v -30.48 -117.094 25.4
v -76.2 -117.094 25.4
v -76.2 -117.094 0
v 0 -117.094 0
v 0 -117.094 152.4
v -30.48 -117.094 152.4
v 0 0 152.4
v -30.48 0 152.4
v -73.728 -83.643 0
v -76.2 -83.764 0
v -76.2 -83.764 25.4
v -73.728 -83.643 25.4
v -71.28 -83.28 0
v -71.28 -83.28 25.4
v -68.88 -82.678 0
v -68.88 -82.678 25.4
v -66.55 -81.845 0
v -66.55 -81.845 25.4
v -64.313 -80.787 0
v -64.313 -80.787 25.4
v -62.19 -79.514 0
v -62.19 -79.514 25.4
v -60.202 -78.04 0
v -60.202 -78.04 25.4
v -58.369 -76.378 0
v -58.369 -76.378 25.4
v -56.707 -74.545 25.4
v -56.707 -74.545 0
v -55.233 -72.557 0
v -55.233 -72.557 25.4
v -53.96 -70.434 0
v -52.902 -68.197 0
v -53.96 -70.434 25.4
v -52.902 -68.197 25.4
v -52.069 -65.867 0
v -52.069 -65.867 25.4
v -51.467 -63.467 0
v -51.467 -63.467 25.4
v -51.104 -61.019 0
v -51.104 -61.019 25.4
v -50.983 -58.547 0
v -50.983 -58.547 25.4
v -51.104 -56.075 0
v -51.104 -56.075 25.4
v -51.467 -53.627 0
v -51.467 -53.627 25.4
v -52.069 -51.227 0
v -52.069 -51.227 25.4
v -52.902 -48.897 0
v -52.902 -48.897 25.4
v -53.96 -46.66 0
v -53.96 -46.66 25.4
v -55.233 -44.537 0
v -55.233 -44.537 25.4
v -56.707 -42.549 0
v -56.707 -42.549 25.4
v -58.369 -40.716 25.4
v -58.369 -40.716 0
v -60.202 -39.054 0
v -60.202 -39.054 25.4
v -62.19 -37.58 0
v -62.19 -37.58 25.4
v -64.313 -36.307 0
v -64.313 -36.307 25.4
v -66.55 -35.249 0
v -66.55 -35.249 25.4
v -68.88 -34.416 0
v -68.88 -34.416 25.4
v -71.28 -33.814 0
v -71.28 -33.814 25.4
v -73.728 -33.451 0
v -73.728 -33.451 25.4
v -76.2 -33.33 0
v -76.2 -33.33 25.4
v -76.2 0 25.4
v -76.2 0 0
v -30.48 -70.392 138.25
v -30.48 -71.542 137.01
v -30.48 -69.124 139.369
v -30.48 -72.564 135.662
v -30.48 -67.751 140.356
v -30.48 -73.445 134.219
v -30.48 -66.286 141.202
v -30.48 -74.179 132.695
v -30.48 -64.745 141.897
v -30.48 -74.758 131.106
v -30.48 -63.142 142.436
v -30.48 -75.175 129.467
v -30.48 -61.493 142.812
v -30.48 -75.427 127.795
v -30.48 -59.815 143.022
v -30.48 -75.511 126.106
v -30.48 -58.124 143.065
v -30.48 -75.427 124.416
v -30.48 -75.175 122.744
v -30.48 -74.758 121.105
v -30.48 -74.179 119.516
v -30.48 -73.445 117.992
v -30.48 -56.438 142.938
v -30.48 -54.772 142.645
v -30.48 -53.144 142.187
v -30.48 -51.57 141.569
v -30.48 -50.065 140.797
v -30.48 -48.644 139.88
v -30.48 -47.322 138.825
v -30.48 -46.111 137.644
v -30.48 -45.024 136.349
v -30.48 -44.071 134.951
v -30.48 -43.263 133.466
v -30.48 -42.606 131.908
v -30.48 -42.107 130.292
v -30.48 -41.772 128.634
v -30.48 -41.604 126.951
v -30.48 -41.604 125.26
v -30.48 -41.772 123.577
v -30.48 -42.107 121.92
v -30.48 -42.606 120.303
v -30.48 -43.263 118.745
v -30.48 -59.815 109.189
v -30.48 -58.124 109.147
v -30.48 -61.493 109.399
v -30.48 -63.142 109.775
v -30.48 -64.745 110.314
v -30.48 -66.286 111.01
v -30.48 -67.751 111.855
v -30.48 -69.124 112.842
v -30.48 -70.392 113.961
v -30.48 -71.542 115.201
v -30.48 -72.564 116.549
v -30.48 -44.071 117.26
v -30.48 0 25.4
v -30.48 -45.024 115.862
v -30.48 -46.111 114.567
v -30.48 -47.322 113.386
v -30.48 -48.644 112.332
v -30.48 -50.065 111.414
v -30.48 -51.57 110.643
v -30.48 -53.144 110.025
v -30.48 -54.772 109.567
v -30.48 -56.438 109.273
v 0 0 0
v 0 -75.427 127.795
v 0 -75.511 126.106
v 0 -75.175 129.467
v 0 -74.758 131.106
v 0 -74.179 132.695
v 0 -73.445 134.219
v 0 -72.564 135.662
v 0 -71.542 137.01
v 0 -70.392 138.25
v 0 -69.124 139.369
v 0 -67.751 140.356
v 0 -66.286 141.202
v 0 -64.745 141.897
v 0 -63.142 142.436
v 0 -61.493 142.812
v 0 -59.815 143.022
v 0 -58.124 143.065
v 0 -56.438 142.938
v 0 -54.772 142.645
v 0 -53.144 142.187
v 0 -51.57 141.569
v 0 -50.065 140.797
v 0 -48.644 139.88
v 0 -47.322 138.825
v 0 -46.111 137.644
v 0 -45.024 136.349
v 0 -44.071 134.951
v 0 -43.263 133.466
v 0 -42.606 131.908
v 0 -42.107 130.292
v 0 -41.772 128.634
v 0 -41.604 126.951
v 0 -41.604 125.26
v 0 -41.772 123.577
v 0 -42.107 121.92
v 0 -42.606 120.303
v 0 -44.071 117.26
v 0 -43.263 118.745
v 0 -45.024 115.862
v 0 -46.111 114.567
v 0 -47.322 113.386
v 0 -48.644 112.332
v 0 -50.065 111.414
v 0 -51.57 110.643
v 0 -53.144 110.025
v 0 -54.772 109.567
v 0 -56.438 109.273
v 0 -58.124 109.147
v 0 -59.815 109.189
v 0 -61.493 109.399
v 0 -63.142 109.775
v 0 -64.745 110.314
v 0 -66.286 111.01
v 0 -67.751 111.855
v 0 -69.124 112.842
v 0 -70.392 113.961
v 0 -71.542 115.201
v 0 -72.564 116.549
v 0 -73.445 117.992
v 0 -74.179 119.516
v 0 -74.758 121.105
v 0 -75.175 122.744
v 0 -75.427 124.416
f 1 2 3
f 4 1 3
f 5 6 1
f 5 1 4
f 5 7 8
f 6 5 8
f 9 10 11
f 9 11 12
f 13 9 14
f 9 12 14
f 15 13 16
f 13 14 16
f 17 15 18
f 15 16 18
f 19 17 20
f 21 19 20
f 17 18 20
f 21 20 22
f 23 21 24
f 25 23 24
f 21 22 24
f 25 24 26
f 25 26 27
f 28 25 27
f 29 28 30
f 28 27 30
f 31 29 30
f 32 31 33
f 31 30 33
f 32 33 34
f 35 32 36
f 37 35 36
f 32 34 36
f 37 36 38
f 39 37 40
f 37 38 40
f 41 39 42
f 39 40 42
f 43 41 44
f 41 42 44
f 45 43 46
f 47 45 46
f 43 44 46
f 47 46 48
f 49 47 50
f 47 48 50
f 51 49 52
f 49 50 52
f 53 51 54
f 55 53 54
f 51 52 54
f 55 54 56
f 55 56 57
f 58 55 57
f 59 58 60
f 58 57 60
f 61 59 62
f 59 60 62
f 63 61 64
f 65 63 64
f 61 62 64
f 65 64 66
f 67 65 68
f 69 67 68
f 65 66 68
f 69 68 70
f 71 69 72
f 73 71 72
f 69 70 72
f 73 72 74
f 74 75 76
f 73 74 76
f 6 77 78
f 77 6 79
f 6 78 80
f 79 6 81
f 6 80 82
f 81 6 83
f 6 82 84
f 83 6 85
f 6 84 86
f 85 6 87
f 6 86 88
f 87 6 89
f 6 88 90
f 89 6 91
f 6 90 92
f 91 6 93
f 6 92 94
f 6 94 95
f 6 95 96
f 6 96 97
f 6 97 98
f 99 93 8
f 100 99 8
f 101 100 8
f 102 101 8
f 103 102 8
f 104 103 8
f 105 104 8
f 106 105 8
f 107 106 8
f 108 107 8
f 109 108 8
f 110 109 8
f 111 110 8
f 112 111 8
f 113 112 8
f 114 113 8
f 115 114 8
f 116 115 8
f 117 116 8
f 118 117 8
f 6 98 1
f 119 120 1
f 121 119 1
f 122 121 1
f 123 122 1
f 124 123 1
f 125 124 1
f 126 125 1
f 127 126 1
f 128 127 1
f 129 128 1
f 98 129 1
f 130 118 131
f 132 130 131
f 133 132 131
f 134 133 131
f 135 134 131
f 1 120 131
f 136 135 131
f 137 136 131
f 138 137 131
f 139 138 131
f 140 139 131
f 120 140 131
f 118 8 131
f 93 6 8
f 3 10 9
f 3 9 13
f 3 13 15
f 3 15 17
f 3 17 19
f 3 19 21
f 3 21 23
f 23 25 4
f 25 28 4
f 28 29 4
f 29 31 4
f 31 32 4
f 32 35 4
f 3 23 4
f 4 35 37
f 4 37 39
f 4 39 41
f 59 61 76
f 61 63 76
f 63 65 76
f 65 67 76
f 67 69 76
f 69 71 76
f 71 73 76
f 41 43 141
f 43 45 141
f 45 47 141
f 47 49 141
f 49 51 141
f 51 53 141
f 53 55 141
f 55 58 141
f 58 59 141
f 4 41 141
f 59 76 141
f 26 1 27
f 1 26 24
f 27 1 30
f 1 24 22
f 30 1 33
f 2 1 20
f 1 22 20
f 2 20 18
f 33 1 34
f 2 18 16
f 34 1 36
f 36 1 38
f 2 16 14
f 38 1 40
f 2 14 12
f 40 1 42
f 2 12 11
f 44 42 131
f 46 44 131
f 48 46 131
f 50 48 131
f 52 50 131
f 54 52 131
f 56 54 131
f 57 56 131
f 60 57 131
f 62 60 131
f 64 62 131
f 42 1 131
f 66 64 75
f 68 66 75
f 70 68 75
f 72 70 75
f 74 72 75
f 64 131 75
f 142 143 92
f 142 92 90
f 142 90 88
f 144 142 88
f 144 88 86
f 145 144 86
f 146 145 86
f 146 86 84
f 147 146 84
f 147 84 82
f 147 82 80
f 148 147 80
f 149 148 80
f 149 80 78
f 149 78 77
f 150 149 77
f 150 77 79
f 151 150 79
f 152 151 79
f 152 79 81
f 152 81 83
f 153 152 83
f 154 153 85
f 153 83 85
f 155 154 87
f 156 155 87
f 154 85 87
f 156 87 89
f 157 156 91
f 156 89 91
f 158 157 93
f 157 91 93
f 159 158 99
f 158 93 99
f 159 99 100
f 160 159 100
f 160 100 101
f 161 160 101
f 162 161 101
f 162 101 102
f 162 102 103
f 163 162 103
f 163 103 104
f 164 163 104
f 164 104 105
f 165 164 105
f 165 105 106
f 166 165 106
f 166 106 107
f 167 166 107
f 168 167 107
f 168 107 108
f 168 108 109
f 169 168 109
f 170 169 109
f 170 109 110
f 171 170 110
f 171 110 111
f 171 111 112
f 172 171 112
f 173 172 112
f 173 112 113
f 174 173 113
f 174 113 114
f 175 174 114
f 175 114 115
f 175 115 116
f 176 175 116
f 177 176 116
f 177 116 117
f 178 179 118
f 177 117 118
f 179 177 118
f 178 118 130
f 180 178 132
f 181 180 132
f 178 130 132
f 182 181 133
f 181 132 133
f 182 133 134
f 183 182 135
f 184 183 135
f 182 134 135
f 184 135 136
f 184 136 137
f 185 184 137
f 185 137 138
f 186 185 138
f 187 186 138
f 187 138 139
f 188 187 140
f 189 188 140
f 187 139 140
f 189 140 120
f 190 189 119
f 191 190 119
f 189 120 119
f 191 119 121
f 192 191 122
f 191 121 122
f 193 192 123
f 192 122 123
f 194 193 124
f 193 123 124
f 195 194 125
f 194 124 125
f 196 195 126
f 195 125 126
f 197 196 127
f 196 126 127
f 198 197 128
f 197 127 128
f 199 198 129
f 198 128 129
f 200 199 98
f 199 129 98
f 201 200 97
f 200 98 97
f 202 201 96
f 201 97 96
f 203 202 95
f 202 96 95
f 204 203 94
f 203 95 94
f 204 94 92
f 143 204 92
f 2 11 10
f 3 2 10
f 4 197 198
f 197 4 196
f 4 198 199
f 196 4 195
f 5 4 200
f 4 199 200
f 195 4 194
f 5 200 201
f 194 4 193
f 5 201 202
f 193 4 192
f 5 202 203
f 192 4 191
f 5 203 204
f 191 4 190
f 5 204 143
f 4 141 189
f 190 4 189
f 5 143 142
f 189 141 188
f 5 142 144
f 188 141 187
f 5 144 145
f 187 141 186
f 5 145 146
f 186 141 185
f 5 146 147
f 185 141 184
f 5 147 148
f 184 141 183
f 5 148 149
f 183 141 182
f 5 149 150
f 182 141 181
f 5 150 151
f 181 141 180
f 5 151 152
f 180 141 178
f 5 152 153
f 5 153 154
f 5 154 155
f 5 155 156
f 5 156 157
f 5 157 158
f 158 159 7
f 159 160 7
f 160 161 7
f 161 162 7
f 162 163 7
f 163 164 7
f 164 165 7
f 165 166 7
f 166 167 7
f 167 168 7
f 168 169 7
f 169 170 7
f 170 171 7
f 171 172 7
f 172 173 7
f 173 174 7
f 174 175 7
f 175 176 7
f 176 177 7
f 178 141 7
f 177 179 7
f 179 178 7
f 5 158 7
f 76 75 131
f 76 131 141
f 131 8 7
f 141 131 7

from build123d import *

# Parameters (mm, degrees)
F1_DEPTH = 117.094
F4_DEPTH = 25.4
F2_R     = 16.9643352209
F2_R_2   = 9.9441
F5_DEPTH = 65.278


with BuildPart() as f1:
    # F0 (on Front) → F1 (new body)
    with BuildSketch(Plane.XZ):
        Polygon((-76.2, 0), (0, 0), (0, 152.4), (-30.48, 152.4), (-30.48, 25.4), (-76.2, 25.4), align=None)
    extrude(amount=F1_DEPTH)

    # F3 (on face) → F4 (cut)
    with BuildSketch(Plane.XY.offset(25.4)):
        with BuildLine():
            ThreePointArc((-76.2, -83.7641331735), (-50.9828668265, -58.547), (-76.2, -33.3298668265))
            Line((-76.2, -33.3298668265), (-76.2, -83.7641331735))
        make_face()
    extrude(amount=-F4_DEPTH, mode=Mode.SUBTRACT)

    # F2 (on face) → F5 (cut)
    with BuildSketch(Plane(origin=(-30.48, 0, 0), x_dir=(0, -1, 0), z_dir=(-1, 0, 0))):
        with Locations((58.547, 126.1055916548)):
            Circle(F2_R)
        with Locations((58.547, 126.1055916548)):
            Circle(F2_R_2, mode=Mode.SUBTRACT)
        with Locations((58.547, 126.1055916548)):
            Circle(F2_R_2)
    extrude(amount=-F5_DEPTH, mode=Mode.SUBTRACT)


solid = f1.part
